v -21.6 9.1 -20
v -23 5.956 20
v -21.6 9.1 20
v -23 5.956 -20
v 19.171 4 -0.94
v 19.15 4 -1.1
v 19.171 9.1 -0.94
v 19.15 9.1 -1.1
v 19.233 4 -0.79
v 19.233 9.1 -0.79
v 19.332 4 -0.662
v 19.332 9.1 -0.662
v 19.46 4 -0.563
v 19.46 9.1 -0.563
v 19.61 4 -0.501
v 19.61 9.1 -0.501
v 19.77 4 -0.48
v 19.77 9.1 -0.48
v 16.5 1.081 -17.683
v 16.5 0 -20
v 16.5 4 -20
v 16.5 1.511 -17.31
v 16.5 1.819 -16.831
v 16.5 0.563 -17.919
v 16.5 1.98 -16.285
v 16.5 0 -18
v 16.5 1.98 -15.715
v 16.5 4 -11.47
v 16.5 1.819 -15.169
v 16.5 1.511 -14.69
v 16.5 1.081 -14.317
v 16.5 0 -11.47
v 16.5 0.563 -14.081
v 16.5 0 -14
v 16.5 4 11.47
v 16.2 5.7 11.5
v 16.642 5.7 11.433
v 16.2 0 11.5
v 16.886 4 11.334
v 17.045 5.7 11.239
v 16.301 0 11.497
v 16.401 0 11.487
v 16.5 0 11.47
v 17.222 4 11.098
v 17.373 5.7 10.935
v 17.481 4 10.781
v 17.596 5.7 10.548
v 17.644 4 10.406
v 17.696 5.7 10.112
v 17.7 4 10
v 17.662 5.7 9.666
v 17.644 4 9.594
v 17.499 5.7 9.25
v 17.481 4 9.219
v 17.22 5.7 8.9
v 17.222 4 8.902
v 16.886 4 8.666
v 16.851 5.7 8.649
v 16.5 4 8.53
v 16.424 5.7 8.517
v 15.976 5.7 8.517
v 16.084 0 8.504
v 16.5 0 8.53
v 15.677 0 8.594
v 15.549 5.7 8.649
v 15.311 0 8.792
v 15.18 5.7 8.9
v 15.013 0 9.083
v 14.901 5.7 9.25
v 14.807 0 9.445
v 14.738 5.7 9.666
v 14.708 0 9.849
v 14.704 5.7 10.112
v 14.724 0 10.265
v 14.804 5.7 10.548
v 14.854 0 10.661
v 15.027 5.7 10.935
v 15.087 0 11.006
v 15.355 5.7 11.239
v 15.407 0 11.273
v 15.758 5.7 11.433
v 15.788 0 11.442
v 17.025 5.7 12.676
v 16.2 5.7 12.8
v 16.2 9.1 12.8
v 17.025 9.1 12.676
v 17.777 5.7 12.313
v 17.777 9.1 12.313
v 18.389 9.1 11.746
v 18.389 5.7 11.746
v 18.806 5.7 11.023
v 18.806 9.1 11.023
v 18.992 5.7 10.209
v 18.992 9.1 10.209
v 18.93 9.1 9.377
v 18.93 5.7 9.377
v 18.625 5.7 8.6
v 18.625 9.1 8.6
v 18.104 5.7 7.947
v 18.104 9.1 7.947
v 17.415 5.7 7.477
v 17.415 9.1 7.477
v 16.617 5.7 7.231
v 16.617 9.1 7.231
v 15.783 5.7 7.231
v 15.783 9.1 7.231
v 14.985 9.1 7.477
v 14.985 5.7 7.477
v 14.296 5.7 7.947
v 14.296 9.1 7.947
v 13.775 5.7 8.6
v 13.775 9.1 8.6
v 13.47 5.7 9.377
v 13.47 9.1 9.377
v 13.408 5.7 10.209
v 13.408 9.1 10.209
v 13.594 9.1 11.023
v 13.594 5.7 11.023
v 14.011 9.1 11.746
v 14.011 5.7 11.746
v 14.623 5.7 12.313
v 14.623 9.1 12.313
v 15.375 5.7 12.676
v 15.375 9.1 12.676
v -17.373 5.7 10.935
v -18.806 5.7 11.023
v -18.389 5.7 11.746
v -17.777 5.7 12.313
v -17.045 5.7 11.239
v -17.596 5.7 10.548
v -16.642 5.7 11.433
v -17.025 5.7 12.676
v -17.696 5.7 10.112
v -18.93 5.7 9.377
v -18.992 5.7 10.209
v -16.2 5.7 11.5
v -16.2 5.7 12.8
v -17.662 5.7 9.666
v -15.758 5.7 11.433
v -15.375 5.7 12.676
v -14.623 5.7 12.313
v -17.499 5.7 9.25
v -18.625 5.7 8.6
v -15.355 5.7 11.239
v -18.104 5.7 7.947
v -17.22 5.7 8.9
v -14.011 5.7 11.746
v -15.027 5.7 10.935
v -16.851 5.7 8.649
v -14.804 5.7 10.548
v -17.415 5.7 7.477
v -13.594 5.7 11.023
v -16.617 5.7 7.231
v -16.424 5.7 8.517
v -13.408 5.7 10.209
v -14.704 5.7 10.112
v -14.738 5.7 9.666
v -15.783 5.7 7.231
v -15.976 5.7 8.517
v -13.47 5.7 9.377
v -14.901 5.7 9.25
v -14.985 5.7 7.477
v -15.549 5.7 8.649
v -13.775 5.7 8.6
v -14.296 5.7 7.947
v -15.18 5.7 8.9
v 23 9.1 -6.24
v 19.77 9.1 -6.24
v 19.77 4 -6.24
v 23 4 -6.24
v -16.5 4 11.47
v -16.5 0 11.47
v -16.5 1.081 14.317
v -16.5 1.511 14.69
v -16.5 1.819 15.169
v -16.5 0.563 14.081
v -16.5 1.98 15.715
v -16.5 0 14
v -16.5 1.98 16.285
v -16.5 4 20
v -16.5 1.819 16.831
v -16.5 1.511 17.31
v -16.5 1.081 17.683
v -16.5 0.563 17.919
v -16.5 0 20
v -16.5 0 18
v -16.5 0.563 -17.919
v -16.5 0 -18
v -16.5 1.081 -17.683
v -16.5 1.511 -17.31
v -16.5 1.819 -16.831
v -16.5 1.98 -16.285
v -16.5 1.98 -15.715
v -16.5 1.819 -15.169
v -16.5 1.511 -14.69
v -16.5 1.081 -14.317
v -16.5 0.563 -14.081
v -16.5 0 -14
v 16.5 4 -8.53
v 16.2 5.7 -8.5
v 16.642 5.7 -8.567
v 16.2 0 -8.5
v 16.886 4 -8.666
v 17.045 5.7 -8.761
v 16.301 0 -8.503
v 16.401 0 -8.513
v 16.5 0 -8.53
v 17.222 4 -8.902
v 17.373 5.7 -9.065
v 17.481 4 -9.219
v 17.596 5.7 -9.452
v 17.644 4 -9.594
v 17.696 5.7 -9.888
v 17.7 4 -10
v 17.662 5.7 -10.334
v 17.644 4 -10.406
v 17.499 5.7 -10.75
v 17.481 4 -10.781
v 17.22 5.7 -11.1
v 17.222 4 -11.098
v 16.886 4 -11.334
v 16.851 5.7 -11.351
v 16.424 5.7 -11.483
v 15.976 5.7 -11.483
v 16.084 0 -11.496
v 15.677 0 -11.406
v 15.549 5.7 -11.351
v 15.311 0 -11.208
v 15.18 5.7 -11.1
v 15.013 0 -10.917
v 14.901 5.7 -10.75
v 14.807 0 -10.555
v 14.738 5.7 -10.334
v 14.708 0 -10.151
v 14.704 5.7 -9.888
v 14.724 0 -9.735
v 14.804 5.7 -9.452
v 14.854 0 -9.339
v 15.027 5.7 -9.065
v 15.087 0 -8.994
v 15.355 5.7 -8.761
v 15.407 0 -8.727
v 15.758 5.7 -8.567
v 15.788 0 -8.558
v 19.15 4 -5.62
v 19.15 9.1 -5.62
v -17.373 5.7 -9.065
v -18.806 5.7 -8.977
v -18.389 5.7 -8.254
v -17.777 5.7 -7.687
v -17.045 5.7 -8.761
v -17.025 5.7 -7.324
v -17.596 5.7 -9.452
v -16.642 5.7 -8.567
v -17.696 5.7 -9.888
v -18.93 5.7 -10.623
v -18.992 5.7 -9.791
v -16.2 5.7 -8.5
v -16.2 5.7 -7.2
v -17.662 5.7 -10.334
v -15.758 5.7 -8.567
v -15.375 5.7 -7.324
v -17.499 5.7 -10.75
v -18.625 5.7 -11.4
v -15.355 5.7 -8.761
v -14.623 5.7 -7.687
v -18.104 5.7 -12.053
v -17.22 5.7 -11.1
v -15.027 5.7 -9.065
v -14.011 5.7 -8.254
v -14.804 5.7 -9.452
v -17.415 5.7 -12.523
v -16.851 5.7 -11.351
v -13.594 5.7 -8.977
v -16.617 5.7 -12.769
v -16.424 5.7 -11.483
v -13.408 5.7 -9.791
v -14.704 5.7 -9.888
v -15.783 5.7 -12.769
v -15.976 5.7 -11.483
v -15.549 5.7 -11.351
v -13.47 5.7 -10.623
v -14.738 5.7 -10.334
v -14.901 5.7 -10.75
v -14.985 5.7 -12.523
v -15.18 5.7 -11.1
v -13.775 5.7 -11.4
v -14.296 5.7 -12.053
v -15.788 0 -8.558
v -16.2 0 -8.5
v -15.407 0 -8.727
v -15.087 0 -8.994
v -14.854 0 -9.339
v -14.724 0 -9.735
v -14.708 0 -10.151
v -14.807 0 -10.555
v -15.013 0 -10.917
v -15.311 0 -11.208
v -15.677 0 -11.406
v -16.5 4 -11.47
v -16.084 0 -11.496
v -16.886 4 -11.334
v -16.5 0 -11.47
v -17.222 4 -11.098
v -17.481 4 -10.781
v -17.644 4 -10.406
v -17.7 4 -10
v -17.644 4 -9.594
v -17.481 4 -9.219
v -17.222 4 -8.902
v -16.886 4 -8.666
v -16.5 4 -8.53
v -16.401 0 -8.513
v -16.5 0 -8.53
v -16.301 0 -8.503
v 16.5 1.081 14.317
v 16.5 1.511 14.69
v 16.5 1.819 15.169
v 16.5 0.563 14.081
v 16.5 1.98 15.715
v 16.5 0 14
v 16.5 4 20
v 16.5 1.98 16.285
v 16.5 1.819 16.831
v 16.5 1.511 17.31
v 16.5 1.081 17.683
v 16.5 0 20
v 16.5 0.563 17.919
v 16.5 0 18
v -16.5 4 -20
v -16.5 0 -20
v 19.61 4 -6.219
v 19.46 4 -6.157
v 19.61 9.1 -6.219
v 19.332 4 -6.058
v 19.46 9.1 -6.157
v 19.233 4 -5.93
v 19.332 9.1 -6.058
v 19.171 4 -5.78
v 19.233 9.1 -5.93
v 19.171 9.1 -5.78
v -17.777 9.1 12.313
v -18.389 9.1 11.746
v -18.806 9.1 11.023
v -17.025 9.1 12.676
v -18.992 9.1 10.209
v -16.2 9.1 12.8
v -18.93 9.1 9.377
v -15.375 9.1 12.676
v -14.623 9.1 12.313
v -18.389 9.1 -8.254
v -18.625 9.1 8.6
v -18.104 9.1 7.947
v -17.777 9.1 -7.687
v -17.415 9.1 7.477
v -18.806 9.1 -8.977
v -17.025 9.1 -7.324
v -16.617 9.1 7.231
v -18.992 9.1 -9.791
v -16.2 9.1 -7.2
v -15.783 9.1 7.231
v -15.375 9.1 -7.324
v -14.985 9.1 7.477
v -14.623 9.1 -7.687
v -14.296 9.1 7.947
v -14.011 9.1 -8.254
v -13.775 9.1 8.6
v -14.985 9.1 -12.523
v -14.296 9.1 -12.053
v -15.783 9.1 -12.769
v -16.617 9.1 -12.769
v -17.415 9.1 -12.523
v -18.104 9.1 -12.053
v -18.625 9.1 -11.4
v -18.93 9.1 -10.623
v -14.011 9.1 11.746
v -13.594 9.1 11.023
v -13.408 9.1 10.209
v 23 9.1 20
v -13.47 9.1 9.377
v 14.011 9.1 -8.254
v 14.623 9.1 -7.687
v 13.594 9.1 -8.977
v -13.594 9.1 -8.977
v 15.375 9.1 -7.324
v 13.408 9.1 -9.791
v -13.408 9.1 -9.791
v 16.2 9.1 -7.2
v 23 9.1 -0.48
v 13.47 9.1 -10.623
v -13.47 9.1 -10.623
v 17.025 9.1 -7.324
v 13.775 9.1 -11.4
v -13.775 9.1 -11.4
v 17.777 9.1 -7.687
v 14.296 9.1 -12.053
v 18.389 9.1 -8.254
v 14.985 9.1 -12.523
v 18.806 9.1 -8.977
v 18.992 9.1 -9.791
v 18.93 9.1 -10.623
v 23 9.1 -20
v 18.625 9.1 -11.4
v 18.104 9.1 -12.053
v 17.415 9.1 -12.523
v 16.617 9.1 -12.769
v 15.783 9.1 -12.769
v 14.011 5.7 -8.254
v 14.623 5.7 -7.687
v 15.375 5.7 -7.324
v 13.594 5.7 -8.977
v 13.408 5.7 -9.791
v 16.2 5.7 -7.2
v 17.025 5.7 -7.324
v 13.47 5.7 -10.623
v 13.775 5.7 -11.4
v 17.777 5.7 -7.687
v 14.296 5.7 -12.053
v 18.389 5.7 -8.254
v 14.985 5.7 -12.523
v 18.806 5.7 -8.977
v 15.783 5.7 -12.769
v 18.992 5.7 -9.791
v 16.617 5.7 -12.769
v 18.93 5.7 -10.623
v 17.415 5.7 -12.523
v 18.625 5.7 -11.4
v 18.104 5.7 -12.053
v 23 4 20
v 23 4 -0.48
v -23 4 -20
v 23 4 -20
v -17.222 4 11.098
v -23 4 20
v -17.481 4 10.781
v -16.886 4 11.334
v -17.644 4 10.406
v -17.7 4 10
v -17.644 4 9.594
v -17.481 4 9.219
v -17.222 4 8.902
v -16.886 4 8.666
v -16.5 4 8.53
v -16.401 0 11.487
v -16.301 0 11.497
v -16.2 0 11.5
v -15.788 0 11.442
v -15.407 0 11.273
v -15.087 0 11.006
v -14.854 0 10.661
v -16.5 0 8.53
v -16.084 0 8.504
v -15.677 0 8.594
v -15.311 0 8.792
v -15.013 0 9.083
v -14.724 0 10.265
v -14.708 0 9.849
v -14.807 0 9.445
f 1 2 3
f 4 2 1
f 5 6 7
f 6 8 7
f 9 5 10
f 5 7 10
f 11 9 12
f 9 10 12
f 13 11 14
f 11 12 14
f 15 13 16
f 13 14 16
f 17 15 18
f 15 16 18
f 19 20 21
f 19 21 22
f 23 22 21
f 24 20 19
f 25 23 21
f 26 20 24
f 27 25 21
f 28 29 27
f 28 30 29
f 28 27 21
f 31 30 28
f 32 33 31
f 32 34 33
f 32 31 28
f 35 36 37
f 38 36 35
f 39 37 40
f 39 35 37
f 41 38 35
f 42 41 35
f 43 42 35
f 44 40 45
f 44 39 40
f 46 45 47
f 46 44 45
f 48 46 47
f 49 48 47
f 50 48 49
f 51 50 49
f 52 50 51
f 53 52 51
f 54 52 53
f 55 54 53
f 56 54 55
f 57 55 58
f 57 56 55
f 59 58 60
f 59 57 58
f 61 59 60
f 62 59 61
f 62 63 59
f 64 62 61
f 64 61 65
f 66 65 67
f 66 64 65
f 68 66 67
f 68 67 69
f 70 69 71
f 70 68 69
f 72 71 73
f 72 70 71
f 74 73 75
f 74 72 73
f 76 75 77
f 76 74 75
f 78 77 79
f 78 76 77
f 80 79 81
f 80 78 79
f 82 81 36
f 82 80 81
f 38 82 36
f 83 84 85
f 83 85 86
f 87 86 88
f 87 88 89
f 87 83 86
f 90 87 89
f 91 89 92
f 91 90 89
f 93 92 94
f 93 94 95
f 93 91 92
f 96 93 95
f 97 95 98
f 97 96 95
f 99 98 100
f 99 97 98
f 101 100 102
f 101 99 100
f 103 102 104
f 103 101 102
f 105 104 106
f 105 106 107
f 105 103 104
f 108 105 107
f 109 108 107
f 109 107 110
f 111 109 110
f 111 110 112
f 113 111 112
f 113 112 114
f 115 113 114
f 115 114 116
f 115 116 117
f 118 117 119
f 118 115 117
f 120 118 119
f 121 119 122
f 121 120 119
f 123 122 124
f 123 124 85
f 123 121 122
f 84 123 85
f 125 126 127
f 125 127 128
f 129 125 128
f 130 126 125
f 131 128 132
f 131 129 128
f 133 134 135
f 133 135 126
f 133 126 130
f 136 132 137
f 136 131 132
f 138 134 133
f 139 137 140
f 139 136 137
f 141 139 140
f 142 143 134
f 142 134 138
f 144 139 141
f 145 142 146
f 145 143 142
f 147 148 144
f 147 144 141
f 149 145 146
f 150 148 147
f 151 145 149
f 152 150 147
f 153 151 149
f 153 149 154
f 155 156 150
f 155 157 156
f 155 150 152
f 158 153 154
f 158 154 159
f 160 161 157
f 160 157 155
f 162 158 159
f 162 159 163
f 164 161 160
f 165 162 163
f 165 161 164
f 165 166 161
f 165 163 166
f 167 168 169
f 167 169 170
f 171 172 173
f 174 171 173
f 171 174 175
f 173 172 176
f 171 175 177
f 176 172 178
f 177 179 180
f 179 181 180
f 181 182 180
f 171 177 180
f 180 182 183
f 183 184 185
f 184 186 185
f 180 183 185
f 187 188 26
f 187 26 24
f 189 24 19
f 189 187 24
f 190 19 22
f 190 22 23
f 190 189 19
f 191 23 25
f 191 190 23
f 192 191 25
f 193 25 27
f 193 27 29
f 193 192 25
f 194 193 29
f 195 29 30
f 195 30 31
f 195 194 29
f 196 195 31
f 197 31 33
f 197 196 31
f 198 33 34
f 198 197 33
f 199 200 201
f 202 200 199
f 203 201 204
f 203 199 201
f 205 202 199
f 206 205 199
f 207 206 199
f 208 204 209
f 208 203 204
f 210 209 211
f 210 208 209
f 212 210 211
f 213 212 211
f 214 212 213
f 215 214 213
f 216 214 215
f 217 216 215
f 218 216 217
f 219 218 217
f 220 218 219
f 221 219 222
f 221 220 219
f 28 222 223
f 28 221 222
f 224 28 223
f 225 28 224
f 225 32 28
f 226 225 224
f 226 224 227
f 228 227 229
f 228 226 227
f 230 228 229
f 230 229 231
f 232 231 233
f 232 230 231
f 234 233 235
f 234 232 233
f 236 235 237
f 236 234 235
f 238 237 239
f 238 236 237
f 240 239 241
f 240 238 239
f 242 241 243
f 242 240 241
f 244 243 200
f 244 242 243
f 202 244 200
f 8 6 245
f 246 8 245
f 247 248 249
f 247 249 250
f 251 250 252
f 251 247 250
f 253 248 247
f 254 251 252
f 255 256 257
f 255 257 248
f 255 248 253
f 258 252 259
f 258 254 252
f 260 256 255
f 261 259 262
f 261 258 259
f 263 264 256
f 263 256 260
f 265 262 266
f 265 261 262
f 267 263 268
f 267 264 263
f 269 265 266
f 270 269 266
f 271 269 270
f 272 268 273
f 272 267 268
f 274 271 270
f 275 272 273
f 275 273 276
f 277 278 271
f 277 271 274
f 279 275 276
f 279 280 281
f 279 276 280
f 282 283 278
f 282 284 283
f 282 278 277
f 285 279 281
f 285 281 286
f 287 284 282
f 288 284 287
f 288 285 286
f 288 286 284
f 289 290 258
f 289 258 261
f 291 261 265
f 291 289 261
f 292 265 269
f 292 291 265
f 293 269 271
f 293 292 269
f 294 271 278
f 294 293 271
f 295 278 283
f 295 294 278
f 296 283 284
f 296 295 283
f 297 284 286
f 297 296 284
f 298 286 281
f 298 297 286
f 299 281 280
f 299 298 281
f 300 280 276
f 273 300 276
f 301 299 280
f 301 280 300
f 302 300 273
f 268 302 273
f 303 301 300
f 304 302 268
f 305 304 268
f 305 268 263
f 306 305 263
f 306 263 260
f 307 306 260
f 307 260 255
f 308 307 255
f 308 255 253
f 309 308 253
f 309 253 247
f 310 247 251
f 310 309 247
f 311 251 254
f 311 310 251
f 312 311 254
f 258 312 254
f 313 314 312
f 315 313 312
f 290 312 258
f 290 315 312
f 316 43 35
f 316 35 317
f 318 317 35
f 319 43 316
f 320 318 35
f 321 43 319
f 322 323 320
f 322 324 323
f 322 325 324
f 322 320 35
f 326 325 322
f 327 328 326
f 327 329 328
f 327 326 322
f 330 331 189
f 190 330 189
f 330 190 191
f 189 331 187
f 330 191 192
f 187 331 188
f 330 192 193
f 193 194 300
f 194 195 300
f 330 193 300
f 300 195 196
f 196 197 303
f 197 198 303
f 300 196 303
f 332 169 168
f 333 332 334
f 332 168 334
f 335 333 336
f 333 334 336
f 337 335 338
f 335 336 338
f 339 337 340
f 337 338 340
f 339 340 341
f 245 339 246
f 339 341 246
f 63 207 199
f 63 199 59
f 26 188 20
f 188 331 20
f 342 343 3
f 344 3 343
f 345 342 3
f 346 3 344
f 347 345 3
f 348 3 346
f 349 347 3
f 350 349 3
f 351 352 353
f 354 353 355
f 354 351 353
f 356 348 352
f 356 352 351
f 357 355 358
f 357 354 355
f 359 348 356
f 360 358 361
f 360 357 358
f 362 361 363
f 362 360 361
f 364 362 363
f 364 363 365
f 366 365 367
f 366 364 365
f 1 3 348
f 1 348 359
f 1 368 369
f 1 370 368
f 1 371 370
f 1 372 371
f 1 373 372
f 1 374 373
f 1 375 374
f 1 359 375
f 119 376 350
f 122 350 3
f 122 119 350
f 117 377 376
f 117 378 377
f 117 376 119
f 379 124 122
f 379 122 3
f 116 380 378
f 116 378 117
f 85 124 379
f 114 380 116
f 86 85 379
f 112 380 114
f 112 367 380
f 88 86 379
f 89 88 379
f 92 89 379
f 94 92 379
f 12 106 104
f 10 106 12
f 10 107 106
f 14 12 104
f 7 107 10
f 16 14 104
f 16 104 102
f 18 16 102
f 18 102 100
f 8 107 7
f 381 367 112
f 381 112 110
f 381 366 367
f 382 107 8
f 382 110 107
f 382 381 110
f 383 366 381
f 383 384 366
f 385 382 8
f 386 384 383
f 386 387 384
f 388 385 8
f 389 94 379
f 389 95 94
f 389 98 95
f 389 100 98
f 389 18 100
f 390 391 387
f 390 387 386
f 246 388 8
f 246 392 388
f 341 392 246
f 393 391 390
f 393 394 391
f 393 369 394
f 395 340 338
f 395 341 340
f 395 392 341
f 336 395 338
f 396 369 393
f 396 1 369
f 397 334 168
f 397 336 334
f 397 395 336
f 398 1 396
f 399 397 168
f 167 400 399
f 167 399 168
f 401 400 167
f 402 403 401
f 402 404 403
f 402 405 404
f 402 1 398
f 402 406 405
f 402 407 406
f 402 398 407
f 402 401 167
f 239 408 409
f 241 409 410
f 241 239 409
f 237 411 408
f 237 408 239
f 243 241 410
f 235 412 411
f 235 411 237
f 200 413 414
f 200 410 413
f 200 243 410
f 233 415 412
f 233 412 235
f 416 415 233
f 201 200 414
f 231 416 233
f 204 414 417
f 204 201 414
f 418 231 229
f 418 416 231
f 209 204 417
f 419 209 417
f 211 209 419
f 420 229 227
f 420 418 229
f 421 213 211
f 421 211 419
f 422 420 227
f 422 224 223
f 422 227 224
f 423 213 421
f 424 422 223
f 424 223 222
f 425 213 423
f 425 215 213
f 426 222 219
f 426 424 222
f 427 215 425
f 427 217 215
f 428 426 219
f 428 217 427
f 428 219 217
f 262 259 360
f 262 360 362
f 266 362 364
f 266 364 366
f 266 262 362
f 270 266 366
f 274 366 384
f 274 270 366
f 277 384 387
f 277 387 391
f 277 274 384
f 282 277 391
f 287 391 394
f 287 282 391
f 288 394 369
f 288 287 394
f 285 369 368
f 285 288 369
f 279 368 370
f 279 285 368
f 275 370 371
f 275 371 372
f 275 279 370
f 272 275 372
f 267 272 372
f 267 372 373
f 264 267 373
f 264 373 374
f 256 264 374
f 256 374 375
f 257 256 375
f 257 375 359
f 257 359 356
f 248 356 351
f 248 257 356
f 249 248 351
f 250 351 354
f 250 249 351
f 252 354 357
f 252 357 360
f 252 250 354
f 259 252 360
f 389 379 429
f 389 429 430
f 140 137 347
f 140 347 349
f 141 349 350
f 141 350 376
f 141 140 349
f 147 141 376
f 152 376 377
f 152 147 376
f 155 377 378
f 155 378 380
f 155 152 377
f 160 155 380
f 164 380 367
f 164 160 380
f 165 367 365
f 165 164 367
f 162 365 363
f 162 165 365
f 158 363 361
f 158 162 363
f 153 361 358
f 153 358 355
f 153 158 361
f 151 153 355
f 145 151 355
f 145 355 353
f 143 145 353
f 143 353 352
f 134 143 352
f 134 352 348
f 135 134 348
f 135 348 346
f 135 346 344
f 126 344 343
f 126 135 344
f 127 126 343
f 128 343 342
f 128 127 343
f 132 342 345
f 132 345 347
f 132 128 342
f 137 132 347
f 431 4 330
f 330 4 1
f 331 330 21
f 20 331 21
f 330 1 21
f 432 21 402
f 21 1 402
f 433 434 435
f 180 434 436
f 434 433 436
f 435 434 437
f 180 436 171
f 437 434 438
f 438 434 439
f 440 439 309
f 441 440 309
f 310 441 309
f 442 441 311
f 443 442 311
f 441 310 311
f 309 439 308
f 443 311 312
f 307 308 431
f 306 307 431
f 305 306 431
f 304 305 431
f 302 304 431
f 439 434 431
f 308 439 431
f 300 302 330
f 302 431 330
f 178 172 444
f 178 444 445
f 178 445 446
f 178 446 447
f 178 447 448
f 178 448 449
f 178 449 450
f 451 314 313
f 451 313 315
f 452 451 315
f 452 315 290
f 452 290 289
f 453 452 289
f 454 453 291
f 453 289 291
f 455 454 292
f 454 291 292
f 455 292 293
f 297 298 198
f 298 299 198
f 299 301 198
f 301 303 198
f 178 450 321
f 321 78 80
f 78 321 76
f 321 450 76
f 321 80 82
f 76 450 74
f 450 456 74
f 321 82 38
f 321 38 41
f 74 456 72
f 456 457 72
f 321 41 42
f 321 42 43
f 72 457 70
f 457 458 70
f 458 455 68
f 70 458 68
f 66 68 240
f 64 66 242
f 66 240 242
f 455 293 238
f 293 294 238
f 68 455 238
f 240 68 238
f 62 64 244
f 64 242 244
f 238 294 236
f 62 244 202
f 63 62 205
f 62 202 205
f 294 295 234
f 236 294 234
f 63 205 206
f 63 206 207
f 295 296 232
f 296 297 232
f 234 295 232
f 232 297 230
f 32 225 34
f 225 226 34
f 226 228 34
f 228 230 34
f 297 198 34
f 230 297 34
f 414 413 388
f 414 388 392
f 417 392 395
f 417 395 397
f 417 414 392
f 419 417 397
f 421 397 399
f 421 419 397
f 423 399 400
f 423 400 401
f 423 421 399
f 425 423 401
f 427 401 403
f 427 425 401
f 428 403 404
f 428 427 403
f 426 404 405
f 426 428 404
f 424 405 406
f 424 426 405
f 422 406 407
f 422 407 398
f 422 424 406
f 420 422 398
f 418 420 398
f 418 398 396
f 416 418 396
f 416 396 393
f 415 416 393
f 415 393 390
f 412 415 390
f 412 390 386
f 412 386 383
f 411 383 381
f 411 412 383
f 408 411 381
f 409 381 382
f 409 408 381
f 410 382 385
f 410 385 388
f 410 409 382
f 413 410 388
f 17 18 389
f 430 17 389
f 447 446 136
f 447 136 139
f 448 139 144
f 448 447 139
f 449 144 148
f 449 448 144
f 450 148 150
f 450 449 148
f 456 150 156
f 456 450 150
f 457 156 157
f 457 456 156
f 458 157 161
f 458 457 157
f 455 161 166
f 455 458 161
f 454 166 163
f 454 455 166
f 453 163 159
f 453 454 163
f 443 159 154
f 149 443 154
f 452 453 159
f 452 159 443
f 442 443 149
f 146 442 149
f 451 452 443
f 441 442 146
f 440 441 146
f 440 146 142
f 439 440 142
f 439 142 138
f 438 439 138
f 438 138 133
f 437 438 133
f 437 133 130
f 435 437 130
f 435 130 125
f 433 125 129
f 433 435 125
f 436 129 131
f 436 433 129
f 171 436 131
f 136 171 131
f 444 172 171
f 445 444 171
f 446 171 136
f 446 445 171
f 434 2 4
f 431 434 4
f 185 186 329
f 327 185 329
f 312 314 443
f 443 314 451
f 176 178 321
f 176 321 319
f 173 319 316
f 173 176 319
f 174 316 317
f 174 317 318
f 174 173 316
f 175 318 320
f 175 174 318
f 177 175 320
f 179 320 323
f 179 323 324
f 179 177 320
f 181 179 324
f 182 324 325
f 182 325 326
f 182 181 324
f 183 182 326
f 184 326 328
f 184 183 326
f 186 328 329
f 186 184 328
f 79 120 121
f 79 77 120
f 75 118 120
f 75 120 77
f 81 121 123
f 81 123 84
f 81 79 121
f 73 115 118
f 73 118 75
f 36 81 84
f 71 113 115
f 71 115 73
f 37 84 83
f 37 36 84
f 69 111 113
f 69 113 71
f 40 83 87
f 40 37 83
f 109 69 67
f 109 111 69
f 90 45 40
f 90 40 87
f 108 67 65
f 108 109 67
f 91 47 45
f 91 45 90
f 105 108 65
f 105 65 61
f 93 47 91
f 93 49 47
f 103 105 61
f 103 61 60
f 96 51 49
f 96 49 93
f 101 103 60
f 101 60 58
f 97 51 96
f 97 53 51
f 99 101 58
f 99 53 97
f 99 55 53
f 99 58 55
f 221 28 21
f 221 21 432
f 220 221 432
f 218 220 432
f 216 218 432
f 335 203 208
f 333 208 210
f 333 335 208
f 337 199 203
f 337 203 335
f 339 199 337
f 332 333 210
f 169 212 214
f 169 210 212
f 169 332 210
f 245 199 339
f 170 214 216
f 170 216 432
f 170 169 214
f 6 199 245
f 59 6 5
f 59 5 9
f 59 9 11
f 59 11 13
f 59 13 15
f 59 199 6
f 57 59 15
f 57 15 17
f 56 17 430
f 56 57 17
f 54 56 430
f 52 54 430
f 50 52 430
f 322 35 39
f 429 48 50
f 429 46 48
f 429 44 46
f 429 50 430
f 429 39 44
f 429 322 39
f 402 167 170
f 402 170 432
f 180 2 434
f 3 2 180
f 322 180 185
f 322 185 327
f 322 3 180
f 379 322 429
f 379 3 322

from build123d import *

# Parameters (mm, degrees)
SKETCH1_W           = 40
SKETCH1_H           = 40
SKETCH1_R           = 1.5
SKETCH1_R_2         = 2.8
BOSS_EXTRUDE1_DEPTH = 5.7
BOSS_EXTRUDE3_START = 5.7
SKETCH1_3_W         = 40
SKETCH1_3_H         = 40
SKETCH1_3_R         = 2.8
SKETCH1_3_R_2       = 1.5
BOSS_EXTRUDE3_DEPTH = 3.4
SKETCH4_W           = 3.5
SKETCH4_H           = 40
CUT_EXTRUDE2_DEPTH  = 4
SKETCH2_W           = 3
SKETCH2_H           = 40
BOSS_EXTRUDE4_DEPTH = 5.1
CUT_EXTRUDE3_START  = -39.5
SKETCH5_R           = 2
CUT_EXTRUDE3_DEPTH  = 33
CUT_EXTRUDE4_START  = -5.1
SKETCH6_W           = 3.85
SKETCH6_H           = 5.76
CUT_EXTRUDE4_DEPTH  = 5.1
FILLET1_R           = 0.62
CHAMFER1_SIZE       = 1.4
CHAMFER1_SIZE2      = 3.144451483


with BuildPart() as part:
    # Sketch1 → Boss-Extrude1 (new body)
    # profile 1 of 7: a face of its own
    with BuildSketch(Plane(origin=(0, 0, 0), x_dir=(1, 0, 0), z_dir=(0, 1, 0))):
        Rectangle(SKETCH1_W, SKETCH1_H)
        with Locations((0, -10)):
            Circle(SKETCH1_R, mode=Mode.SUBTRACT)
        with Locations((0, 10)):
            Circle(SKETCH1_R, mode=Mode.SUBTRACT)
        with Locations(Location((-16.2, -10, 0), (0, 0, 270))):
            Circle(SKETCH1_R, mode=Mode.SUBTRACT)
        with Locations(Location((16.2, -10, 0), (0, 0, 270))):
            Circle(SKETCH1_R, mode=Mode.SUBTRACT)
        with Locations(Location((16.2, 10, 0), (0, 0, 270))):
            Circle(SKETCH1_R, mode=Mode.SUBTRACT)
        with Locations(Location((-16.2, 10, 0), (0, 0, 270))):
            Circle(SKETCH1_R, mode=Mode.SUBTRACT)
    # profile 2 of 7: a face of its own
    with BuildSketch(Plane(origin=(0, 0, 0), x_dir=(1, 0, 0), z_dir=(0, 1, 0))):
        with Locations((0, 10)):
            Circle(SKETCH1_R)
    # profile 3 of 7: a face of its own
    with BuildSketch(Plane(origin=(0, 0, 0), x_dir=(1, 0, 0), z_dir=(0, 1, 0))):
        with Locations((0, -10)):
            Circle(SKETCH1_R)
    # profile 4 of 7: a face of its own
    with BuildSketch(Plane(origin=(0, 0, 0), x_dir=(1, 0, 0), z_dir=(0, 1, 0))):
        with Locations((-16.2, 10)):
            Circle(SKETCH1_R_2)
        with Locations(Location((-16.2, 10, 0), (0, 0, 270))):
            Circle(SKETCH1_R, mode=Mode.SUBTRACT)
    # profile 5 of 7: a face of its own
    with BuildSketch(Plane(origin=(0, 0, 0), x_dir=(1, 0, 0), z_dir=(0, 1, 0))):
        with Locations((-16.2, -10)):
            Circle(SKETCH1_R_2)
        with Locations(Location((-16.2, -10, 0), (0, 0, 270))):
            Circle(SKETCH1_R, mode=Mode.SUBTRACT)
    # profile 6 of 7: a face of its own
    with BuildSketch(Plane(origin=(0, 0, 0), x_dir=(1, 0, 0), z_dir=(0, 1, 0))):
        with Locations((16.2, 10)):
            Circle(SKETCH1_R_2)
        with Locations(Location((16.2, 10, 0), (0, 0, 270))):
            Circle(SKETCH1_R, mode=Mode.SUBTRACT)
    # profile 7 of 7: a face of its own
    with BuildSketch(Plane(origin=(0, 0, 0), x_dir=(1, 0, 0), z_dir=(0, 1, 0))):
        with Locations((16.2, -10)):
            Circle(SKETCH1_R_2)
        with Locations(Location((16.2, -10, 0), (0, 0, 270))):
            Circle(SKETCH1_R, mode=Mode.SUBTRACT)
    extrude(amount=BOSS_EXTRUDE1_DEPTH)

    # Sketch1_3 → Boss-Extrude3 (add)
    # profile 1 of 3: a face of its own
    with BuildSketch(Plane(origin=(0, 0, 0), x_dir=(1, 0, 0), z_dir=(0, 1, 0)).offset(BOSS_EXTRUDE3_START)):
        Rectangle(SKETCH1_3_W, SKETCH1_3_H)
        with Locations(Location((16.2, 10, 0), (0, 0, 270))):
            Circle(SKETCH1_3_R, mode=Mode.SUBTRACT)
        with Locations(Location((-16.2, 10, 0), (0, 0, 270))):
            Circle(SKETCH1_3_R, mode=Mode.SUBTRACT)
        with Locations((0, -10)):
            Circle(SKETCH1_3_R_2, mode=Mode.SUBTRACT)
        with Locations((0, 10)):
            Circle(SKETCH1_3_R_2, mode=Mode.SUBTRACT)
        with Locations(Location((-16.2, -10, 0), (0, 0, 270))):
            Circle(SKETCH1_3_R, mode=Mode.SUBTRACT)
        with Locations(Location((16.2, -10, 0), (0, 0, 270))):
            Circle(SKETCH1_3_R, mode=Mode.SUBTRACT)
    # profile 2 of 3: a face of its own
    with BuildSketch(Plane(origin=(0, 0, 0), x_dir=(1, 0, 0), z_dir=(0, 1, 0)).offset(BOSS_EXTRUDE3_START)):
        with Locations((0, 10)):
            Circle(SKETCH1_3_R_2)
    # profile 3 of 3: a face of its own
    with BuildSketch(Plane(origin=(0, 0, 0), x_dir=(1, 0, 0), z_dir=(0, 1, 0)).offset(BOSS_EXTRUDE3_START)):
        with Locations((0, -10)):
            Circle(SKETCH1_3_R_2)
    extrude(amount=BOSS_EXTRUDE3_DEPTH)

    # Sketch4 → Cut-Extrude2 (cut)
    with BuildSketch(Plane.XZ):
        with Locations((18.25, 0)):
            Rectangle(SKETCH4_W, SKETCH4_H)
        with Locations((-18.25, 0)):
            Rectangle(SKETCH4_W, SKETCH4_H)
    extrude(amount=-CUT_EXTRUDE2_DEPTH, mode=Mode.SUBTRACT)

    # Sketch2 → Boss-Extrude4 (add)
    with BuildSketch(Plane(origin=(0, 9.1, 0), x_dir=(1, 0, 0), z_dir=(0, 1, 0))):
        with Locations((-21.5, 0)):
            Rectangle(SKETCH2_W, SKETCH2_H)
        with Locations((21.5, 0)):
            Rectangle(SKETCH2_W, SKETCH2_H)
    extrude(amount=-BOSS_EXTRUDE4_DEPTH)

    # Sketch5 → Cut-Extrude3 (cut)
    with BuildSketch(Plane(origin=(23, 0, 0), x_dir=(0, 0, -1), z_dir=(1, 0, 0)).offset(CUT_EXTRUDE3_START)):
        with Locations((16, 0)):
            Circle(SKETCH5_R)
        with Locations((-16, 0)):
            Circle(SKETCH5_R)
    extrude(amount=CUT_EXTRUDE3_DEPTH, mode=Mode.SUBTRACT)

    # Sketch6 → Cut-Extrude4 (cut)
    with BuildSketch(Plane(origin=(0, 9.1, 0), x_dir=(1, 0, 0), z_dir=(0, 1, 0)).offset(CUT_EXTRUDE4_START)):
        with Locations((21.075, 3.36)):
            Rectangle(SKETCH6_W, SKETCH6_H)
    extrude(amount=CUT_EXTRUDE4_DEPTH, mode=Mode.SUBTRACT)

    # Fillet1
    fillet1_edges = [part.edges().sort_by_distance(p)[0] for p in [
        (19.15, 6.55, -0.48),
        (19.15, 6.55, -6.24),
    ]]
    fillet(fillet1_edges, radius=FILLET1_R)

    # Chamfer1
    chamfer1_edges = [part.edges().sort_by_distance(p)[0] for p in [
        (-23, 9.1, 0),
    ]]
    chamfer1_side = [part.faces().sort_by_distance(p)[0] for p in [
        (-0.269953671, 9.1, 0.043011548),
    ]]
    chamfer(chamfer1_edges, length=CHAMFER1_SIZE, length2=CHAMFER1_SIZE2, reference=chamfer1_side[0])


solid = part.part
